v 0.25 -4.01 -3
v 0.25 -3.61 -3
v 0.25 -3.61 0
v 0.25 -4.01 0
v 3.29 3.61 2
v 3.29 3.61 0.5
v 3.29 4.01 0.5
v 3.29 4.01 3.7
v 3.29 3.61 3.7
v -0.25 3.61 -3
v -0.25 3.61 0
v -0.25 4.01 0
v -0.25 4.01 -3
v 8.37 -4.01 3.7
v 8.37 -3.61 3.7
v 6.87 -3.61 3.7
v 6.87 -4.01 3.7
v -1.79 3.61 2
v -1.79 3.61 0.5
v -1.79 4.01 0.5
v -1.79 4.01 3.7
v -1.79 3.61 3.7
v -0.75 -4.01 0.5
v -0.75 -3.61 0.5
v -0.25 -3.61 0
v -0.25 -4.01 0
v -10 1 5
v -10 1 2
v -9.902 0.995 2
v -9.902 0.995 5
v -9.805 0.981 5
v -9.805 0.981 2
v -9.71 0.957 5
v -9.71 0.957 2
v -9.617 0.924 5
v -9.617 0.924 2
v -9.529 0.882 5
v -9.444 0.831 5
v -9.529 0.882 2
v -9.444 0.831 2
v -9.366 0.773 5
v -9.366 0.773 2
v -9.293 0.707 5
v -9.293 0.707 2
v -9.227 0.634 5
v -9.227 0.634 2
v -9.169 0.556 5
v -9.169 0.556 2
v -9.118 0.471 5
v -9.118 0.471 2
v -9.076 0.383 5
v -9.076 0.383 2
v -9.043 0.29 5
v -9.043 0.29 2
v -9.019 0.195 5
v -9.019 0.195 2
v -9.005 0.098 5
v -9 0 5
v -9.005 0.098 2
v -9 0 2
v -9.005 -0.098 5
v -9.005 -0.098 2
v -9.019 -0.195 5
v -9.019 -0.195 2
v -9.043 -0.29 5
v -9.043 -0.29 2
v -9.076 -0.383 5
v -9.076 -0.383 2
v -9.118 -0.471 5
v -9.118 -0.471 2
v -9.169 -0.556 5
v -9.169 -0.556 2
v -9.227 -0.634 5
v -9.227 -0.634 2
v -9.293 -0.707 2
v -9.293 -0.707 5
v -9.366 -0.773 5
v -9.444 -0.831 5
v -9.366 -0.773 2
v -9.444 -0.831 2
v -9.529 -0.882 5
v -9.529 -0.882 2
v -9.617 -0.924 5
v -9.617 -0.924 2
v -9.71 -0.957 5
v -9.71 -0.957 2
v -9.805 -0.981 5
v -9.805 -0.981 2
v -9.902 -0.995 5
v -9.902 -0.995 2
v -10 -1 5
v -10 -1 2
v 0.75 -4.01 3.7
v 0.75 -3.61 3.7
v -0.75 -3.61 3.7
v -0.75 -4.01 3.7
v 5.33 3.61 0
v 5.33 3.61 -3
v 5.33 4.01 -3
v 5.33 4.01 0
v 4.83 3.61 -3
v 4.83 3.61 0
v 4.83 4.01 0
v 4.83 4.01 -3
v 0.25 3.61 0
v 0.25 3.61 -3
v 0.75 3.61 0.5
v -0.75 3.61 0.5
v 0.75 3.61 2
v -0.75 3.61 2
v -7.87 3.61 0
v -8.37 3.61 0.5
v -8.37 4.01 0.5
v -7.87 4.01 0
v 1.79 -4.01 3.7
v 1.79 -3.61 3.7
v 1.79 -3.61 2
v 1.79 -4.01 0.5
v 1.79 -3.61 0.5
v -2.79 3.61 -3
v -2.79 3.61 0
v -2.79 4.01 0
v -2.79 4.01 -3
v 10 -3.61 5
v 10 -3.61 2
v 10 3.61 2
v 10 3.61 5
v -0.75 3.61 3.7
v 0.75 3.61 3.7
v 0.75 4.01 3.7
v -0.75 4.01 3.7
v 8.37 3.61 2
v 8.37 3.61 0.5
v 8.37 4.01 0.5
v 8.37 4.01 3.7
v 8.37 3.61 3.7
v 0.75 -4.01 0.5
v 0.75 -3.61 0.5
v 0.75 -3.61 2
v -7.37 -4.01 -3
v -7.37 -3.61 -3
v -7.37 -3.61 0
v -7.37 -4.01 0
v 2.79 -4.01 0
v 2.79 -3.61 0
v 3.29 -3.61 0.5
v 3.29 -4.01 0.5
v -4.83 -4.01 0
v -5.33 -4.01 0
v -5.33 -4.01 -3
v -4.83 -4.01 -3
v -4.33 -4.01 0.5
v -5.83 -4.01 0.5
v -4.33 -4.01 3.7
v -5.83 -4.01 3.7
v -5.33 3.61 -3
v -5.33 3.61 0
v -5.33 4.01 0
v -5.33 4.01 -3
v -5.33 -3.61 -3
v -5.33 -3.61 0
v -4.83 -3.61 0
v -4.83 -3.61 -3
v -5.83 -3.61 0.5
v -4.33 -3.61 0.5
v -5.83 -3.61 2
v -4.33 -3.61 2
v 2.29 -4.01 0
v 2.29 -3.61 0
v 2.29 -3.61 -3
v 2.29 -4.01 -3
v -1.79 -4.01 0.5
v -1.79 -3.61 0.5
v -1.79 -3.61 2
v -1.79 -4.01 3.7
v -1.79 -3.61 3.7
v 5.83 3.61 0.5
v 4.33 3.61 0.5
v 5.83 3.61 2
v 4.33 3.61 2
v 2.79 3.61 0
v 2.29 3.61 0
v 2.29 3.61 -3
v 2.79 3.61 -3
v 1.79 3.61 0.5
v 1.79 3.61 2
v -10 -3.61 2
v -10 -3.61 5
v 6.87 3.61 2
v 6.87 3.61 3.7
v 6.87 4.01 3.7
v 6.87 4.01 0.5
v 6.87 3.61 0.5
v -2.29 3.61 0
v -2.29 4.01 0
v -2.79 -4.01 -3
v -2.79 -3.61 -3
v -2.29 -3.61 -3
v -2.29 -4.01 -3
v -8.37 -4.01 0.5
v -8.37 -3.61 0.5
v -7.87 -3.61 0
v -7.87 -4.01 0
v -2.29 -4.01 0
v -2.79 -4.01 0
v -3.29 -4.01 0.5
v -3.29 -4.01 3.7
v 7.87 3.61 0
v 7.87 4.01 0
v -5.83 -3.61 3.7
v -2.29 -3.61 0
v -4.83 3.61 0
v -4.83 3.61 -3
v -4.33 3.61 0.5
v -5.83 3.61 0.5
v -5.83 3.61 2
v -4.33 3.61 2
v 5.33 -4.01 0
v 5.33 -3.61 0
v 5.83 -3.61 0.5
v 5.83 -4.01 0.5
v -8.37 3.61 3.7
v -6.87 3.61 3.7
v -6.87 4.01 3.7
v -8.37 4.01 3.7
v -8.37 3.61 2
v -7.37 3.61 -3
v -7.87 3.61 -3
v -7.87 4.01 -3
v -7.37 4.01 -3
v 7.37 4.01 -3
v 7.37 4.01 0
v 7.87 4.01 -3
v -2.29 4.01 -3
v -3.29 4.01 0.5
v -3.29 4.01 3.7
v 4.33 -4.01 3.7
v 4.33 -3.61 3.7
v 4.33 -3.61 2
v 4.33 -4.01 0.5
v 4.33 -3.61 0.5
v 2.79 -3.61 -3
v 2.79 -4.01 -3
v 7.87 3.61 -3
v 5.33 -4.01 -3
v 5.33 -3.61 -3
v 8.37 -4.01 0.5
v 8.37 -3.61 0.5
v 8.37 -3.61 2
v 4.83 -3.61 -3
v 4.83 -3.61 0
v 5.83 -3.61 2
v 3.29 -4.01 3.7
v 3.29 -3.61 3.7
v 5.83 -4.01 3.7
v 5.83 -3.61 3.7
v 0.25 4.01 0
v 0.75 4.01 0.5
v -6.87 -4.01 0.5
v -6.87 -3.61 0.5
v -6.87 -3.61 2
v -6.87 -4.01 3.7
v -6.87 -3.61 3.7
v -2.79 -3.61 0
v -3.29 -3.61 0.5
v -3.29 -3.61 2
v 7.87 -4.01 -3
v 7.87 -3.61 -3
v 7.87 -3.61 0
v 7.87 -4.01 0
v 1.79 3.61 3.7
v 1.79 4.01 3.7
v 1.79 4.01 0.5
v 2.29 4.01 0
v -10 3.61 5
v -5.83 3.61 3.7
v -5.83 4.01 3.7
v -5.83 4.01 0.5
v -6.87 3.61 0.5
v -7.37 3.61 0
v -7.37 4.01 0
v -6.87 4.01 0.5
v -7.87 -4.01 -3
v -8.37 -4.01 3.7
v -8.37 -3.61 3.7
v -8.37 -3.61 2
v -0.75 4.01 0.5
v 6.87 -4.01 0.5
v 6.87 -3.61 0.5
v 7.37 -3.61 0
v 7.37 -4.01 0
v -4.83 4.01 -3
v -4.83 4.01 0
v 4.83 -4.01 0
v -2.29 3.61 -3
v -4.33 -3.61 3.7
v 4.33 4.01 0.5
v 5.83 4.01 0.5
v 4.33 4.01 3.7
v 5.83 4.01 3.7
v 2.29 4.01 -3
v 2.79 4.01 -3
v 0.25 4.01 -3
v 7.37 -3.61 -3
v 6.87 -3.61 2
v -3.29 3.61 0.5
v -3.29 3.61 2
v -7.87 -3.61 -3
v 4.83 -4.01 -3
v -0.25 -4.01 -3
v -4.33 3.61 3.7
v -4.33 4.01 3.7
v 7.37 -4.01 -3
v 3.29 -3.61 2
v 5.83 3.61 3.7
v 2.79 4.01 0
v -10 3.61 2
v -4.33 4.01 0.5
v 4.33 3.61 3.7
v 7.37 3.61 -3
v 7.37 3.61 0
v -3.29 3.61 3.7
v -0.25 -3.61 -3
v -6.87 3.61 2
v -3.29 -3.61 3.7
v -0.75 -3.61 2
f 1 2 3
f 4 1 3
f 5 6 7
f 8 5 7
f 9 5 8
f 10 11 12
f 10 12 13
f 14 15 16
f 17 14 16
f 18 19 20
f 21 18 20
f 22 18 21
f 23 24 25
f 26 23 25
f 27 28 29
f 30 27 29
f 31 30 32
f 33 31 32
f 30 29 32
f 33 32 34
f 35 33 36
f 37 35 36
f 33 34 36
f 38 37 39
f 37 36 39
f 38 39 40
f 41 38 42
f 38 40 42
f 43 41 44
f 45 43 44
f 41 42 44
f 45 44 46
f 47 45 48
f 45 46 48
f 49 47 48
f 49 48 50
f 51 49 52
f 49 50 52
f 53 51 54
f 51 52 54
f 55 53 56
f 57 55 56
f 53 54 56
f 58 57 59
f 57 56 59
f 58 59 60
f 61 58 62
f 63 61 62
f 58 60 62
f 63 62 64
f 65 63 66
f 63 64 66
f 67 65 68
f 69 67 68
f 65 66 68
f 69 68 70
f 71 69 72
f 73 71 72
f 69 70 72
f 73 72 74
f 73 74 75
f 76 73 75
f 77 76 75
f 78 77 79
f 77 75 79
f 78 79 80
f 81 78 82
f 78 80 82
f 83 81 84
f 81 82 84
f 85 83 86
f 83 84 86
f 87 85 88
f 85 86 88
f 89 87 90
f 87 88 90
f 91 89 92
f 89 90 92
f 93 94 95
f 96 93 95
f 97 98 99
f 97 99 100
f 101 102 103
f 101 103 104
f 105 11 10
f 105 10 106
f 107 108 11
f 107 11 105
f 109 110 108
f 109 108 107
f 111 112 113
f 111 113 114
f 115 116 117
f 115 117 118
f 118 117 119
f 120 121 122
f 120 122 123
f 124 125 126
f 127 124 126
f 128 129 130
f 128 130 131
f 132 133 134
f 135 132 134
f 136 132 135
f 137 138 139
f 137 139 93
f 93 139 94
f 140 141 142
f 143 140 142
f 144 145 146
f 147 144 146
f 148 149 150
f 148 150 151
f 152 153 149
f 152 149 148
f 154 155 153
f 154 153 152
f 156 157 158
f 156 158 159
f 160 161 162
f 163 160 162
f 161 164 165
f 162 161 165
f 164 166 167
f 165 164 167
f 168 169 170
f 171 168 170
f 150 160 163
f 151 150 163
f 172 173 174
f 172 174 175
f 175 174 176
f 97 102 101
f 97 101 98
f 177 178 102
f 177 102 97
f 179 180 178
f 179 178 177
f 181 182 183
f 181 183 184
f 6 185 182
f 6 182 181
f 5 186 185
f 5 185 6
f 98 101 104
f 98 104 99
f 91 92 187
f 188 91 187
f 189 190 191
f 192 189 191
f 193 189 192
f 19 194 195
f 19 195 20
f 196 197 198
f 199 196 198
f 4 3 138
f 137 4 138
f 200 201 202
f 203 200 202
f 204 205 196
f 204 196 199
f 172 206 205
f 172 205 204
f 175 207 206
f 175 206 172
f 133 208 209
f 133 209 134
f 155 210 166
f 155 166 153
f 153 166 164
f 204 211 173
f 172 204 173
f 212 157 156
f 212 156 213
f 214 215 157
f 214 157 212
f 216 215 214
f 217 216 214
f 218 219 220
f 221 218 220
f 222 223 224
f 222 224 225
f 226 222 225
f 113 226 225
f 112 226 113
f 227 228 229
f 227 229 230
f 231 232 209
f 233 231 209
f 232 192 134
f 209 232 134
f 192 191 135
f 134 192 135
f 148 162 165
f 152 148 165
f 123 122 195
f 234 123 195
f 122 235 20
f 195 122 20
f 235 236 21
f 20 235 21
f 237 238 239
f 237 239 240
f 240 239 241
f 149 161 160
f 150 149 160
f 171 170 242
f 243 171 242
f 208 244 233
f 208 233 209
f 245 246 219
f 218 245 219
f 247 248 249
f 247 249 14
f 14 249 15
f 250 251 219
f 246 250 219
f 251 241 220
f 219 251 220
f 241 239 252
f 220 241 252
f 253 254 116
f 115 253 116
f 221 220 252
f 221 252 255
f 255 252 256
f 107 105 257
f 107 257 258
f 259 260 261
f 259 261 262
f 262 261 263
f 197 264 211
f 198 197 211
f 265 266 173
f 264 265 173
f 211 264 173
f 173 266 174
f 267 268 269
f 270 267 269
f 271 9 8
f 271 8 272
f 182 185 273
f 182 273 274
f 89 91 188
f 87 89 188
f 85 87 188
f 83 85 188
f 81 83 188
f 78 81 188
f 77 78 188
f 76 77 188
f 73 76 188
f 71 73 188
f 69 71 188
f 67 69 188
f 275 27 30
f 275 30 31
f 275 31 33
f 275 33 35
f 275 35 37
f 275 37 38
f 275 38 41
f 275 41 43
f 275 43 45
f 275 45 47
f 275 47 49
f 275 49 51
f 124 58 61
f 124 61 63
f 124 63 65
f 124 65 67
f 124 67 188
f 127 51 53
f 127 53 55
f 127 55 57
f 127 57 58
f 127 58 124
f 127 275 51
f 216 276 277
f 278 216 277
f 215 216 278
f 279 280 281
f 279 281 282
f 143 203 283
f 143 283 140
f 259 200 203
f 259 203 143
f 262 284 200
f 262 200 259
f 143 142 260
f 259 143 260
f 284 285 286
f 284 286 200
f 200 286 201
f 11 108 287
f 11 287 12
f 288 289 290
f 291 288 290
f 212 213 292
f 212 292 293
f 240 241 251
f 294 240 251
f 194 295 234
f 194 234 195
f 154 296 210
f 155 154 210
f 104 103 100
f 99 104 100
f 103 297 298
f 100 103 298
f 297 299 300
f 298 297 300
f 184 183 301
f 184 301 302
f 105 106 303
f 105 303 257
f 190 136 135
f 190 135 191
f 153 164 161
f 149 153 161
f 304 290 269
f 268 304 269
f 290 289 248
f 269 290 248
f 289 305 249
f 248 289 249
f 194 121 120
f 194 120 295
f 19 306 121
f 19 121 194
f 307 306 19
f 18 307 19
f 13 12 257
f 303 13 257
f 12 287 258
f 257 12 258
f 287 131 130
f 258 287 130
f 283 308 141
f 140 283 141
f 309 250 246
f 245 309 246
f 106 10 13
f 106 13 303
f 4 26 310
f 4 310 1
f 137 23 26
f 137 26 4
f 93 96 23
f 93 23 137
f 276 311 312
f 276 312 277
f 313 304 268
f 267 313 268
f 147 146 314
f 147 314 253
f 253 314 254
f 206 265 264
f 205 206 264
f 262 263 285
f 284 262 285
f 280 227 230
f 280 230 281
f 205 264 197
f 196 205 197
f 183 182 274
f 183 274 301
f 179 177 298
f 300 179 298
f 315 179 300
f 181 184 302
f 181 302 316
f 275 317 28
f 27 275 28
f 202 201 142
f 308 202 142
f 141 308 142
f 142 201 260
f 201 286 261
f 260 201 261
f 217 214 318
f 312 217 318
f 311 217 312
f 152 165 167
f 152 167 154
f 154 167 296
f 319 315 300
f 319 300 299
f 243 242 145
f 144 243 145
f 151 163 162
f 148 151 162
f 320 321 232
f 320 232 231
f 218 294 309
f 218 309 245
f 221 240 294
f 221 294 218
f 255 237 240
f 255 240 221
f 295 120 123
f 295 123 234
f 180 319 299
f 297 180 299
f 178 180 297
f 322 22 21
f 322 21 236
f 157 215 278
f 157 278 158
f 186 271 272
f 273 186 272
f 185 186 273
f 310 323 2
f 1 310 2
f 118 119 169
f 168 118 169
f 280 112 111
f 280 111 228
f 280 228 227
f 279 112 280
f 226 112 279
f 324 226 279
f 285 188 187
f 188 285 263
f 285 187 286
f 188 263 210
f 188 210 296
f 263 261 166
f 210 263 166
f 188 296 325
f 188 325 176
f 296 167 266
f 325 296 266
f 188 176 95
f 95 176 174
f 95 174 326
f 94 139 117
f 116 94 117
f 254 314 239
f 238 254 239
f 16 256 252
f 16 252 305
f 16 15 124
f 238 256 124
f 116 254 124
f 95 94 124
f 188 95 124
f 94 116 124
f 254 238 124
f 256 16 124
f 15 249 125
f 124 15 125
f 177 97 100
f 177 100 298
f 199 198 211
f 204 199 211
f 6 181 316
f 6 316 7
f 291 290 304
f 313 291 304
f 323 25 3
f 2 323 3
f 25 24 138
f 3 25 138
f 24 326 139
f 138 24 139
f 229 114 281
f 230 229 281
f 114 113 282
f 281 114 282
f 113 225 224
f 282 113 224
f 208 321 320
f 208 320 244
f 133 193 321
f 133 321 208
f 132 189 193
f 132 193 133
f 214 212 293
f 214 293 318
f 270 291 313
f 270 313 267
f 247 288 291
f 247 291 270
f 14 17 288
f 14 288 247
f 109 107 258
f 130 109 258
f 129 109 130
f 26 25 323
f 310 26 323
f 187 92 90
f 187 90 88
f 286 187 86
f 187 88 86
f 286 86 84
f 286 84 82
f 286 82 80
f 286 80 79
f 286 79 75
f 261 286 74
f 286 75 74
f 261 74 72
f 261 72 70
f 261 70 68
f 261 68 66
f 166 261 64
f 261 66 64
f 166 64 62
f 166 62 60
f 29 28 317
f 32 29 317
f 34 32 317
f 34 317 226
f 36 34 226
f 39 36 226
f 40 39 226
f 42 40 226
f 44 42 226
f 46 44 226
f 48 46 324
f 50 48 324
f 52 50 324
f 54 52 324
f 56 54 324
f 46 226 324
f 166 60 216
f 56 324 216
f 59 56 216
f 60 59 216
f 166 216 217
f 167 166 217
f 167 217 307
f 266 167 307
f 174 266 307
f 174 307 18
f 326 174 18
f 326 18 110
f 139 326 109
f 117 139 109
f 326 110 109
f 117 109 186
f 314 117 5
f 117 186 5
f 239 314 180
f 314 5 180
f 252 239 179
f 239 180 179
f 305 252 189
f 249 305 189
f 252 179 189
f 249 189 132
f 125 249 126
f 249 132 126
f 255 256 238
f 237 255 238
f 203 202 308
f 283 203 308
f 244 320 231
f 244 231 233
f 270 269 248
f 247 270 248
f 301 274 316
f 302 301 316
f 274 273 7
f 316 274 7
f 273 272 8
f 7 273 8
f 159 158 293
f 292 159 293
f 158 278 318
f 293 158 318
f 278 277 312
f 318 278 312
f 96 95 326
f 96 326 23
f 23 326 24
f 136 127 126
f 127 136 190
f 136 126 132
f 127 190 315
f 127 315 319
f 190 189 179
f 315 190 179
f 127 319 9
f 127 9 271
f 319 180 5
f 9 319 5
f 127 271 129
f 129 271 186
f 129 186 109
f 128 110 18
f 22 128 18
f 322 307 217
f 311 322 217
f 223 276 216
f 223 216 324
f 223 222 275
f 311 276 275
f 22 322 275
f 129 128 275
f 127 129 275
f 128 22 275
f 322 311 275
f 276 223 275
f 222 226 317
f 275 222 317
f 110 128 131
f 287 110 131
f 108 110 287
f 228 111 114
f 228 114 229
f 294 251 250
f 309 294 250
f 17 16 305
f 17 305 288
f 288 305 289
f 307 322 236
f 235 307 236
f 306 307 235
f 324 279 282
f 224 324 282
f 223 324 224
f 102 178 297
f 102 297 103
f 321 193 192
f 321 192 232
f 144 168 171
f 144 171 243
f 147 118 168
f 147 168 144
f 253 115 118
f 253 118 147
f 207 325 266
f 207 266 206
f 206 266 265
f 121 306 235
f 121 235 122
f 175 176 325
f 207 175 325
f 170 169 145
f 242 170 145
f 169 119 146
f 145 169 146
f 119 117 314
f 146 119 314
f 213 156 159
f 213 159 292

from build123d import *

# Parameters (mm, degrees)
F1_START = 2
F1_DEPTH = 3
F3_DEPTH = 0.4


# Not quite as in the source:
# - a pattern or mirror of a feature is missing from the dataset's text; its kind, count and spacing are read off the source's solid


with BuildPart() as f1:
    # F0 (on Top) → F1 (new body)
    with BuildSketch(Plane.XY.offset(F1_START)):
        with BuildLine():
            Line((10, 3.61), (-10, 3.61))
            Line((-10, 3.61), (-10, 1))
            ThreePointArc((-10, 1), (-9, 0), (-10, -1))
            Line((-10, -1), (-10, -3.61))
            Line((-10, -3.61), (10, -3.61))
            Line((10, -3.61), (10, 3.61))
        make_face()
    extrude(amount=F1_DEPTH)

    # F2 (on face) → F3 (join)
    with BuildSketch(Plane.XZ.offset(3.61)):
        Polygon((-6.87, 3.7), (-8.37, 3.7), (-8.37, 0.5), (-7.87, 0), (-7.87, -3), (-7.37, -3), (-7.37, 0), (-6.87, 0.5), align=None)
        Polygon((-5.83, 0.5), (-5.33, 0), (-5.33, -3), (-4.83, -3), (-4.83, 0), (-4.33, 0.5), (-4.33, 3.7), (-5.83, 3.7), align=None)
        Polygon((-3.29, 0.5), (-2.79, 0), (-2.79, -3), (-2.29, -3), (-2.29, 0), (-1.79, 0.5), (-1.79, 3.7), (-3.29, 3.7), align=None)
        Polygon((-0.75, 0.5), (-0.25, 0), (-0.25, -3), (0.25, -3), (0.25, 0), (0.75, 0.5), (0.75, 3.7), (-0.75, 3.7), align=None)
        Polygon((1.79, 0.5), (2.29, 0), (2.29, -3), (2.79, -3), (2.79, 0), (3.29, 0.5), (3.29, 3.7), (1.79, 3.7), align=None)
        Polygon((4.33, 0.5), (4.83, 0), (4.83, -3), (5.33, -3), (5.33, 0), (5.83, 0.5), (5.83, 3.7), (4.33, 3.7), align=None)
        Polygon((6.87, 0.5), (7.37, 0), (7.37, -3), (7.87, -3), (7.87, 0), (8.37, 0.5), (8.37, 3.7), (6.87, 3.7), align=None)
    f3 = extrude(amount=F3_DEPTH)

    # F3_copies: F3 across plane
    add(f3.mirror(Plane.ZX))


solid = f1.part
